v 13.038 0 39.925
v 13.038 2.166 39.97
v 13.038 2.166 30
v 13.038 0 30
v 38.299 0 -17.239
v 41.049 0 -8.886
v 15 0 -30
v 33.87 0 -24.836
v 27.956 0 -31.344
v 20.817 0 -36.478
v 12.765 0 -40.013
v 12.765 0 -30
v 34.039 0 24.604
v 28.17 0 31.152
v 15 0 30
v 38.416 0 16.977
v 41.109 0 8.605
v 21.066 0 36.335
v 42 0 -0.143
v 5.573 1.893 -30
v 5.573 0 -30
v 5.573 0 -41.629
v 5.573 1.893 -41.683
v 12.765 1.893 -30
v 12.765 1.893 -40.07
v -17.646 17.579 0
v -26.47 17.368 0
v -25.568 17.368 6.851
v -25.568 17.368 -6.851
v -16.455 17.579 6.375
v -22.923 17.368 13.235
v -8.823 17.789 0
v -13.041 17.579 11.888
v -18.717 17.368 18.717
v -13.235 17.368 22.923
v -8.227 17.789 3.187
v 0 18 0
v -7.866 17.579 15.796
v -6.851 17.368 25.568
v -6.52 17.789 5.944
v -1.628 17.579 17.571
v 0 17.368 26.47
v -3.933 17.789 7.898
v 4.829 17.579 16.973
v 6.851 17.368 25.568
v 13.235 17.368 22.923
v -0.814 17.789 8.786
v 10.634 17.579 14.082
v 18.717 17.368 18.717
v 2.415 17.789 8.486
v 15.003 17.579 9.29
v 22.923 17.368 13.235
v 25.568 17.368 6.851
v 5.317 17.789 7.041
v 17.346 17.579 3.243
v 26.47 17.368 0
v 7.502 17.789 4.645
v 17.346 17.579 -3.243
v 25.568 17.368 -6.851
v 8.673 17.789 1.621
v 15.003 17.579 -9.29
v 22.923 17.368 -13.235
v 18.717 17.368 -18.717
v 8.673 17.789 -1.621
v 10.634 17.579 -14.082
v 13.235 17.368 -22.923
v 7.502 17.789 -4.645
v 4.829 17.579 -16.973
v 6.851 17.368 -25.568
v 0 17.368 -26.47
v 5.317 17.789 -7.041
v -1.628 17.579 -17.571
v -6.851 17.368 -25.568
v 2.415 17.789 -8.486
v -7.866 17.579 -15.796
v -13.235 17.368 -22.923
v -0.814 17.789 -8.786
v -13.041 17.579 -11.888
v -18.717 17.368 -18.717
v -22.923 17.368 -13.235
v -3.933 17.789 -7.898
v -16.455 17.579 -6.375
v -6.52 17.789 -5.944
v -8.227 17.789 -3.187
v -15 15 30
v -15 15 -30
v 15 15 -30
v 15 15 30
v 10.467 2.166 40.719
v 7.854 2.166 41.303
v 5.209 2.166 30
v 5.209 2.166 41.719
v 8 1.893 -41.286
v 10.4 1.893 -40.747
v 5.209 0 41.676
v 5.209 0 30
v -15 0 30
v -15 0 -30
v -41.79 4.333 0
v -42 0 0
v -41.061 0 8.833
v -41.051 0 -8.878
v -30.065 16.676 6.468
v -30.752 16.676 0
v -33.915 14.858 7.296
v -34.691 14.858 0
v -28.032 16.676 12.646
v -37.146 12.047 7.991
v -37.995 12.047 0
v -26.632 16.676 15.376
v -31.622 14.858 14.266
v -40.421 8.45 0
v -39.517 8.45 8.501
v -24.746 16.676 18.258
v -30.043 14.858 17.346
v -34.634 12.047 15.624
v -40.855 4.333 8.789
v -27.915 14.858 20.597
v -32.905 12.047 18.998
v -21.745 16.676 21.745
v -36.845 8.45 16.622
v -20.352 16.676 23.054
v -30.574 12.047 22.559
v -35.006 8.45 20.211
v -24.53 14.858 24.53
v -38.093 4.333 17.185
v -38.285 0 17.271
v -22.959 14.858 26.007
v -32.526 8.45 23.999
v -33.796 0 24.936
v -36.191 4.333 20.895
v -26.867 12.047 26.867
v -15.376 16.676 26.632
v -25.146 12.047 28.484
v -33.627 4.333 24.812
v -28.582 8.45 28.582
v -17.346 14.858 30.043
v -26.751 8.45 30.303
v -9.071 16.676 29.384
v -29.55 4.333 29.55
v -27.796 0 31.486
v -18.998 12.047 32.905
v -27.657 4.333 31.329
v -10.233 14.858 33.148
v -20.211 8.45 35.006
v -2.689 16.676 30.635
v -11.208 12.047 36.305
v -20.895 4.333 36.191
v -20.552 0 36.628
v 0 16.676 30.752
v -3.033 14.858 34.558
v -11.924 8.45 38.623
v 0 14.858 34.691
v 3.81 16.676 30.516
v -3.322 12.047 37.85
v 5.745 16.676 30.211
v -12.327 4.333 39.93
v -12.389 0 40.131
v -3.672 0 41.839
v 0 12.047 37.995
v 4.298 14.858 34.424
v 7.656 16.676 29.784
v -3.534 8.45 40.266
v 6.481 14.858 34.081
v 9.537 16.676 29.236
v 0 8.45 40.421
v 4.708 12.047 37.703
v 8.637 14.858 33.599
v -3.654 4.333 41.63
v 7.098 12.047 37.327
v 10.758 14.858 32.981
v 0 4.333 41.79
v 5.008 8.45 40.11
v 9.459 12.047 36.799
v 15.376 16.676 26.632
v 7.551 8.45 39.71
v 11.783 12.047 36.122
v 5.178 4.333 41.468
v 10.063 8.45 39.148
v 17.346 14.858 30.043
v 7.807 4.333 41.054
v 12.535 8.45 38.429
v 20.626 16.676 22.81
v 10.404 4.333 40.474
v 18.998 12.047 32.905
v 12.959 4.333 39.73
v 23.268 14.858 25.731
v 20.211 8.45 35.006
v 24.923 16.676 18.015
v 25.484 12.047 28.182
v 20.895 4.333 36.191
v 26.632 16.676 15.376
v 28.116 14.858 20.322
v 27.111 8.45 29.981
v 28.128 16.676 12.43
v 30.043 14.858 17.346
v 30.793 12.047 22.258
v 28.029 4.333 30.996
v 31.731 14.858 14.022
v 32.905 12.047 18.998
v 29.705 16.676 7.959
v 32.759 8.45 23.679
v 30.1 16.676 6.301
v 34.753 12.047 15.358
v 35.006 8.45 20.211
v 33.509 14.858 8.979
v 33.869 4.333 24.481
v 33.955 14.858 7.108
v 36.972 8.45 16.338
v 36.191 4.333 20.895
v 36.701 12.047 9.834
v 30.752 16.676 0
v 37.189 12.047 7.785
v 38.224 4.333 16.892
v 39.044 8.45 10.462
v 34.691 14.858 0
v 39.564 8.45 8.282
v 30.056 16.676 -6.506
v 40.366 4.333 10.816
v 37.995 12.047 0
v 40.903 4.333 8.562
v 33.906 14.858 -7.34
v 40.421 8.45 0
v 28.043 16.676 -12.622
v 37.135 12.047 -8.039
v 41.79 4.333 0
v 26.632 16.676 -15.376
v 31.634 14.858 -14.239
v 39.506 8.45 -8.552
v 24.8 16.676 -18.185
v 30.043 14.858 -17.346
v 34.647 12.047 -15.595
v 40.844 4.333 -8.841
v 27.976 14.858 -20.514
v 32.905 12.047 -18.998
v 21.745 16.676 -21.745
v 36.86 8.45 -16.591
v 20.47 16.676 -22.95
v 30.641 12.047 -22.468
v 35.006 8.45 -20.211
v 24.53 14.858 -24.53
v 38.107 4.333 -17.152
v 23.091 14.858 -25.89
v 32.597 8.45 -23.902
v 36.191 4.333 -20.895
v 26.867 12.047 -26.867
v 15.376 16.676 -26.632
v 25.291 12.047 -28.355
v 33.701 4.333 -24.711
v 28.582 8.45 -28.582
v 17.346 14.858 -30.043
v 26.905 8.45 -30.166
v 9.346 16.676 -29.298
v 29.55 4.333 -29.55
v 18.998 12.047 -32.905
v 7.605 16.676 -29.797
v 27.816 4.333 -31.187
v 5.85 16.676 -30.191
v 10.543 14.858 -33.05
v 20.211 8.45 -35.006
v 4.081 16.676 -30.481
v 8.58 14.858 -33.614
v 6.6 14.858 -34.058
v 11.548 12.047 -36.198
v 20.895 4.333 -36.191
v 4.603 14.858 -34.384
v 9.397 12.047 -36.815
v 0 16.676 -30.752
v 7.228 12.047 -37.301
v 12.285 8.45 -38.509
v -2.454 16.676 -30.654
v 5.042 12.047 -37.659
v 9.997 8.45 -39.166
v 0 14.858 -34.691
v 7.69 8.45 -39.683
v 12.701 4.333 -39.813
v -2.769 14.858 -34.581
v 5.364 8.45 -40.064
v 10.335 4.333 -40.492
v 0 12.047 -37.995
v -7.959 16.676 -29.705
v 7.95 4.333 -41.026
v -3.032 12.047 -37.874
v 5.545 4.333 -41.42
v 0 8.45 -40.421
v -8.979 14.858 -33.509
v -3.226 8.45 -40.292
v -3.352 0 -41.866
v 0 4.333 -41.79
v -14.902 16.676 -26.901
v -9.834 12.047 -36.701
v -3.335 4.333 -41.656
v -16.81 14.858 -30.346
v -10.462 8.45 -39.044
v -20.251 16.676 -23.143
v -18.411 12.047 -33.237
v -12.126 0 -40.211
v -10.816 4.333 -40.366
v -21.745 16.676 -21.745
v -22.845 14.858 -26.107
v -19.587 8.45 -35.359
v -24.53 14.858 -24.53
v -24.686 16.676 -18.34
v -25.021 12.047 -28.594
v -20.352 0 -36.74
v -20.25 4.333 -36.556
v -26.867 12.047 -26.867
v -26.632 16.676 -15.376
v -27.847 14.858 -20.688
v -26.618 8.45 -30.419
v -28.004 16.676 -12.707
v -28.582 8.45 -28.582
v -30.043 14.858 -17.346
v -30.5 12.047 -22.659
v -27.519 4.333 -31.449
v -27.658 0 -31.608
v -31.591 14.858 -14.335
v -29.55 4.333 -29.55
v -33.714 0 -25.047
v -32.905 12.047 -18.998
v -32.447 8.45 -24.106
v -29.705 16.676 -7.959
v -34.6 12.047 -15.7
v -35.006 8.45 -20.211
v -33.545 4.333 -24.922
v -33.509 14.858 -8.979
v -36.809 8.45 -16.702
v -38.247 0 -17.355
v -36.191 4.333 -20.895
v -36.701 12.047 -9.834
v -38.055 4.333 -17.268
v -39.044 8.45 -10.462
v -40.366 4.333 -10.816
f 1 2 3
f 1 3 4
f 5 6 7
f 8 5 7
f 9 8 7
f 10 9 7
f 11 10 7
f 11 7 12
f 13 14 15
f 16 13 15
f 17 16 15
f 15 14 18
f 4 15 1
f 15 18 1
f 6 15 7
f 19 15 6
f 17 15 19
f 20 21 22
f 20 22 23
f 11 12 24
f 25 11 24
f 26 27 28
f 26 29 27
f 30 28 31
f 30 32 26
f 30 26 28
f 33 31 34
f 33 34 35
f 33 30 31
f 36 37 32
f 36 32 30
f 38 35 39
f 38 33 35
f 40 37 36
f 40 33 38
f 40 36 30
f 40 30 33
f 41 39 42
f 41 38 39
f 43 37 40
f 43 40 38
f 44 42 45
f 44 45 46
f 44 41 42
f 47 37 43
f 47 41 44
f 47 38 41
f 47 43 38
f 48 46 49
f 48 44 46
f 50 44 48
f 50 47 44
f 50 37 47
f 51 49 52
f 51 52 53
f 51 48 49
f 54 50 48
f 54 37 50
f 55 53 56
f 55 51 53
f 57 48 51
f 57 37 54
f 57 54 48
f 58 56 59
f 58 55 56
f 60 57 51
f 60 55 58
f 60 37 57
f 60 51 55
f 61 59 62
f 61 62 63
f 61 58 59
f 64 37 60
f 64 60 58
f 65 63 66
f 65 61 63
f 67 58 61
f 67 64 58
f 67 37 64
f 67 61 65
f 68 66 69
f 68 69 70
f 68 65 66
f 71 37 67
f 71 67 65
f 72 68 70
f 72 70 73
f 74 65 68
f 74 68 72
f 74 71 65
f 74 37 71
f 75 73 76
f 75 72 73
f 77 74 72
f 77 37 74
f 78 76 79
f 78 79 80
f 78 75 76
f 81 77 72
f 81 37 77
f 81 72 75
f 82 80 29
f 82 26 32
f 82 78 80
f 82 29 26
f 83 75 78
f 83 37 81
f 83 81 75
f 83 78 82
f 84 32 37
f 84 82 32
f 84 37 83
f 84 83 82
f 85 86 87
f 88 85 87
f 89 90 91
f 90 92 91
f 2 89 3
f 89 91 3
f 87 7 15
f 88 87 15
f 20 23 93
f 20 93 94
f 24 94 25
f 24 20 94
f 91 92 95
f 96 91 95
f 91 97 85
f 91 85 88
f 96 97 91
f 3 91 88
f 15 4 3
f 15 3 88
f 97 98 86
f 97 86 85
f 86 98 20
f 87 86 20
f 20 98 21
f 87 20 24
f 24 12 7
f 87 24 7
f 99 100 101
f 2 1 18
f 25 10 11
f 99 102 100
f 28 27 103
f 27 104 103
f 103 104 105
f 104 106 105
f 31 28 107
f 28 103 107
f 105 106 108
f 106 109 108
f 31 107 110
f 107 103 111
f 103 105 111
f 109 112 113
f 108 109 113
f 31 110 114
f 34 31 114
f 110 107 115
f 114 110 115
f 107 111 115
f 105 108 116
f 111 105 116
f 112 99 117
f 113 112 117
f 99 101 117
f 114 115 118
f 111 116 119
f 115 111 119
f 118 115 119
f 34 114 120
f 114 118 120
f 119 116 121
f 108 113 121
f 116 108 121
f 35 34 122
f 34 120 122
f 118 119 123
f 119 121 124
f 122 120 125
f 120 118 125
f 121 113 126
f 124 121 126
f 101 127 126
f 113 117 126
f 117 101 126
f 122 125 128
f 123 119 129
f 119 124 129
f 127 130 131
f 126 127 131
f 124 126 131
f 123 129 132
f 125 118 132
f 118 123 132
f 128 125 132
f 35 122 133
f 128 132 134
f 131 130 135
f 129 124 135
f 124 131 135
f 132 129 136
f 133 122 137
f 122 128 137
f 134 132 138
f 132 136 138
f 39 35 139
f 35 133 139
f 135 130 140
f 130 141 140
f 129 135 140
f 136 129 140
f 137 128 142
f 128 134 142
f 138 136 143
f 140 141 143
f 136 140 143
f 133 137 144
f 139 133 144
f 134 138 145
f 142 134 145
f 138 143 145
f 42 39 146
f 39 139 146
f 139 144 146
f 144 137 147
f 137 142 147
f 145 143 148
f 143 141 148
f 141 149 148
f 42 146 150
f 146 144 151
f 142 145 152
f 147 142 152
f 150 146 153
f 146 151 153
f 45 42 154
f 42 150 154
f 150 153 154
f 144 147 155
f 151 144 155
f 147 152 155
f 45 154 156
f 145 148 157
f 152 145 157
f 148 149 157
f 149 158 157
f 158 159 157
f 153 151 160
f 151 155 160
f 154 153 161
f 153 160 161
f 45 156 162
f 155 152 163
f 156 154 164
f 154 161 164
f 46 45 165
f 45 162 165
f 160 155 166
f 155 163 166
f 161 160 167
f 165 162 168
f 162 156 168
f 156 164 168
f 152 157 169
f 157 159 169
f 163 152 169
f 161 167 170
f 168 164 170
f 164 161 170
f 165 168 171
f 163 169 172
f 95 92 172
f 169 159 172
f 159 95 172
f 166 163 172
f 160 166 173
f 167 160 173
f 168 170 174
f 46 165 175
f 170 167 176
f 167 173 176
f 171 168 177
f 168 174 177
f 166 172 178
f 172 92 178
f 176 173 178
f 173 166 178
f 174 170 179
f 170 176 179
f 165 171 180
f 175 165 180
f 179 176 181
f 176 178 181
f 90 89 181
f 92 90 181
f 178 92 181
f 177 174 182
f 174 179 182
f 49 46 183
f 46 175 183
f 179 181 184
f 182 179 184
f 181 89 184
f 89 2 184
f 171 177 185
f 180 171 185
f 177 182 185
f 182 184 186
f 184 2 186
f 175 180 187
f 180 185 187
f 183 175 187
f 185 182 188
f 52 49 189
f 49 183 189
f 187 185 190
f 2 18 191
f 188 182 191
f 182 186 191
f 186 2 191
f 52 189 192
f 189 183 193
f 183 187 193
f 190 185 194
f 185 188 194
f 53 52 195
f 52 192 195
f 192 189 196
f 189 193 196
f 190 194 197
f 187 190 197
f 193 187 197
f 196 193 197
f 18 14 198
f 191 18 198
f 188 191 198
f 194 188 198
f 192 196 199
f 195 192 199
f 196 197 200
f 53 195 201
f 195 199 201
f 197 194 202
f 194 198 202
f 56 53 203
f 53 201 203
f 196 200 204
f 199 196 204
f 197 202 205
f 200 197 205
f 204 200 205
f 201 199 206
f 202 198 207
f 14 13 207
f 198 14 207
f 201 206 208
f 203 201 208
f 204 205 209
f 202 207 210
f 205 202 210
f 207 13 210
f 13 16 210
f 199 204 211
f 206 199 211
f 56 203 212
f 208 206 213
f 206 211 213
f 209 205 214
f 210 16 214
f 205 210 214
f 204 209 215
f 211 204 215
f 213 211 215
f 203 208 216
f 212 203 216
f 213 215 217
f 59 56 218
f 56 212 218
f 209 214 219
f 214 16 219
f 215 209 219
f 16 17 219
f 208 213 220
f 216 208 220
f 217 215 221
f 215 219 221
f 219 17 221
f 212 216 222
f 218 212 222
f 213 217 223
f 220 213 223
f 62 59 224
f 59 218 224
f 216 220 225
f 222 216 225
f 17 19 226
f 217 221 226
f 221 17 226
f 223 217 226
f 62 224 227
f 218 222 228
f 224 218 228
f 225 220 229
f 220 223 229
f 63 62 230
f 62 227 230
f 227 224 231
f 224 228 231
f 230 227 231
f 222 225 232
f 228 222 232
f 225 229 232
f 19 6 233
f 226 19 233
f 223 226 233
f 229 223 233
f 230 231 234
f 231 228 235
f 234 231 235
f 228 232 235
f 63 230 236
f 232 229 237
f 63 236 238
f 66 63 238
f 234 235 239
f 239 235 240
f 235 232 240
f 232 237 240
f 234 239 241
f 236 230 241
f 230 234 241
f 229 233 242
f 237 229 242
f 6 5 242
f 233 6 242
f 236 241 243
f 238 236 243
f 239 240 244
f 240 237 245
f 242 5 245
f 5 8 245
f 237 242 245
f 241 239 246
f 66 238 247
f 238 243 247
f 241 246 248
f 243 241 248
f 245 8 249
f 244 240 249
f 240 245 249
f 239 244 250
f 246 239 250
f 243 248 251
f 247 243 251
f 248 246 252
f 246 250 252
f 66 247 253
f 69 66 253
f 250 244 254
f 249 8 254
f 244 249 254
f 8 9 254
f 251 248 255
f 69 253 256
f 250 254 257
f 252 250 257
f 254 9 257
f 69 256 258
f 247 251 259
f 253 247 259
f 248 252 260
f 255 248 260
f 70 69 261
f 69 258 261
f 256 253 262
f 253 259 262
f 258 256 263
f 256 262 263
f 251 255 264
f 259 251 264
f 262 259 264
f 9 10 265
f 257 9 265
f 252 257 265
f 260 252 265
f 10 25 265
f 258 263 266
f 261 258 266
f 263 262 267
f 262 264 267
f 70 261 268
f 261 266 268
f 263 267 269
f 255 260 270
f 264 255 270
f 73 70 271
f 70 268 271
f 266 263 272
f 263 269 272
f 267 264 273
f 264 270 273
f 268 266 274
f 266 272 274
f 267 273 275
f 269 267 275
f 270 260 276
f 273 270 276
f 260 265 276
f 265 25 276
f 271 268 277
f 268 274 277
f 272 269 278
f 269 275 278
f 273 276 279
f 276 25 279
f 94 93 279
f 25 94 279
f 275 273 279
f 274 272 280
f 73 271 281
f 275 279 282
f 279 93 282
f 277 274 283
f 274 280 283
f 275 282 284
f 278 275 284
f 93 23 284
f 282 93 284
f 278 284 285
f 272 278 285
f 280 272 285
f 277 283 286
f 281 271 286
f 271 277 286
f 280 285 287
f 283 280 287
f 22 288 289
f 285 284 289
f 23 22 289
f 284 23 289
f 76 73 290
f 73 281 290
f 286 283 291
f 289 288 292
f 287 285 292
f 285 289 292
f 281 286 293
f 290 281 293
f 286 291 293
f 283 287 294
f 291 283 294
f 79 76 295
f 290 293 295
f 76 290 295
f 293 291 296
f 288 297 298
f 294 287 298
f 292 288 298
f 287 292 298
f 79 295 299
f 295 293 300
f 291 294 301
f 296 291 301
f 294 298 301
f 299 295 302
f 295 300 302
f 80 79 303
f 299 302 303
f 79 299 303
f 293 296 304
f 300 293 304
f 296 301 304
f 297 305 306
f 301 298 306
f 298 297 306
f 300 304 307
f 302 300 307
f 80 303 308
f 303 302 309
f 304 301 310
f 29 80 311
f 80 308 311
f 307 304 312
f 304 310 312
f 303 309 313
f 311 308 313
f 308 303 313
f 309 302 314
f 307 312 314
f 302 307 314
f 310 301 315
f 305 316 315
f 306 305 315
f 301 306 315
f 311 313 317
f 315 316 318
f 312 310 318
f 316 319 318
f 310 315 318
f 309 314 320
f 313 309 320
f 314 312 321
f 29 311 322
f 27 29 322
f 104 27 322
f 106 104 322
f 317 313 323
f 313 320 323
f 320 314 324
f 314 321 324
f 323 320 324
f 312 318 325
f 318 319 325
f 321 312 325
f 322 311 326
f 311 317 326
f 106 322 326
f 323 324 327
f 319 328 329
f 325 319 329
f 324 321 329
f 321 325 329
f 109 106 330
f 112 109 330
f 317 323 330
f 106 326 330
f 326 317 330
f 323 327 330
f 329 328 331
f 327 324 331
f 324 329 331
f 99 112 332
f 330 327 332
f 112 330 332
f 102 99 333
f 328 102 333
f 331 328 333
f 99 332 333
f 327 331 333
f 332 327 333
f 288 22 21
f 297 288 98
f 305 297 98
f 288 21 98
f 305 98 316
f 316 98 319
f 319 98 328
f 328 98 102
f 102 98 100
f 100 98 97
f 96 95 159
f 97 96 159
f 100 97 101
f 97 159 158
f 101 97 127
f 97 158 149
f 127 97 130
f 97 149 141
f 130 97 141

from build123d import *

# Parameters (mm, degrees)
SKETCH001_W     = 30
SKETCH001_H     = 60
POCKET_DEPTH    = 15
SKETCH002_W     = 7.828685
SKETCH002_H     = 2.912844
POCKET001_DEPTH = 12.062428
SKETCH003_W     = 7.191467
SKETCH003_H     = 2.548873
POCKET002_DEPTH = 12.062428


with BuildPart() as part:
    # Sketch → Revolution (revolve)
    with BuildSketch(Plane.XY):
        with BuildLine():
            ThreePointArc((-26.469681, 17.367976), (-37.995377, 12.046633), (-42, 0))
            Line((-42, 0), (0, 0))
            Line((0, 18), (0, 0))
            Line((-26.469681, 17.367976), (0, 18))
        make_face()
    revolve(axis=Axis((0, 0, 0), (0, 1, 0)))

    # Sketch001 → Pocket (cut)
    with BuildSketch(Plane.XZ):
        Rectangle(SKETCH001_W, SKETCH001_H)
    extrude(amount=-POCKET_DEPTH, mode=Mode.SUBTRACT)

    # Sketch002 → Pocket001 (cut, through all)
    with BuildSketch(Plane(origin=(0, 0, 30), x_dir=(1, 0, 0), z_dir=(0, 0, -1))):
        with Locations((9.123454, -0.709289)):
            Rectangle(SKETCH002_W, SKETCH002_H)
    extrude(amount=-POCKET001_DEPTH, mode=Mode.SUBTRACT)

    # Sketch003 → Pocket002 (cut, through all)
    with BuildSketch(Plane.XY.offset(-30)):
        with Locations((9.168967, 0.61833)):
            Rectangle(SKETCH003_W, SKETCH003_H)
    extrude(amount=-POCKET002_DEPTH, mode=Mode.SUBTRACT)


solid = part.part
